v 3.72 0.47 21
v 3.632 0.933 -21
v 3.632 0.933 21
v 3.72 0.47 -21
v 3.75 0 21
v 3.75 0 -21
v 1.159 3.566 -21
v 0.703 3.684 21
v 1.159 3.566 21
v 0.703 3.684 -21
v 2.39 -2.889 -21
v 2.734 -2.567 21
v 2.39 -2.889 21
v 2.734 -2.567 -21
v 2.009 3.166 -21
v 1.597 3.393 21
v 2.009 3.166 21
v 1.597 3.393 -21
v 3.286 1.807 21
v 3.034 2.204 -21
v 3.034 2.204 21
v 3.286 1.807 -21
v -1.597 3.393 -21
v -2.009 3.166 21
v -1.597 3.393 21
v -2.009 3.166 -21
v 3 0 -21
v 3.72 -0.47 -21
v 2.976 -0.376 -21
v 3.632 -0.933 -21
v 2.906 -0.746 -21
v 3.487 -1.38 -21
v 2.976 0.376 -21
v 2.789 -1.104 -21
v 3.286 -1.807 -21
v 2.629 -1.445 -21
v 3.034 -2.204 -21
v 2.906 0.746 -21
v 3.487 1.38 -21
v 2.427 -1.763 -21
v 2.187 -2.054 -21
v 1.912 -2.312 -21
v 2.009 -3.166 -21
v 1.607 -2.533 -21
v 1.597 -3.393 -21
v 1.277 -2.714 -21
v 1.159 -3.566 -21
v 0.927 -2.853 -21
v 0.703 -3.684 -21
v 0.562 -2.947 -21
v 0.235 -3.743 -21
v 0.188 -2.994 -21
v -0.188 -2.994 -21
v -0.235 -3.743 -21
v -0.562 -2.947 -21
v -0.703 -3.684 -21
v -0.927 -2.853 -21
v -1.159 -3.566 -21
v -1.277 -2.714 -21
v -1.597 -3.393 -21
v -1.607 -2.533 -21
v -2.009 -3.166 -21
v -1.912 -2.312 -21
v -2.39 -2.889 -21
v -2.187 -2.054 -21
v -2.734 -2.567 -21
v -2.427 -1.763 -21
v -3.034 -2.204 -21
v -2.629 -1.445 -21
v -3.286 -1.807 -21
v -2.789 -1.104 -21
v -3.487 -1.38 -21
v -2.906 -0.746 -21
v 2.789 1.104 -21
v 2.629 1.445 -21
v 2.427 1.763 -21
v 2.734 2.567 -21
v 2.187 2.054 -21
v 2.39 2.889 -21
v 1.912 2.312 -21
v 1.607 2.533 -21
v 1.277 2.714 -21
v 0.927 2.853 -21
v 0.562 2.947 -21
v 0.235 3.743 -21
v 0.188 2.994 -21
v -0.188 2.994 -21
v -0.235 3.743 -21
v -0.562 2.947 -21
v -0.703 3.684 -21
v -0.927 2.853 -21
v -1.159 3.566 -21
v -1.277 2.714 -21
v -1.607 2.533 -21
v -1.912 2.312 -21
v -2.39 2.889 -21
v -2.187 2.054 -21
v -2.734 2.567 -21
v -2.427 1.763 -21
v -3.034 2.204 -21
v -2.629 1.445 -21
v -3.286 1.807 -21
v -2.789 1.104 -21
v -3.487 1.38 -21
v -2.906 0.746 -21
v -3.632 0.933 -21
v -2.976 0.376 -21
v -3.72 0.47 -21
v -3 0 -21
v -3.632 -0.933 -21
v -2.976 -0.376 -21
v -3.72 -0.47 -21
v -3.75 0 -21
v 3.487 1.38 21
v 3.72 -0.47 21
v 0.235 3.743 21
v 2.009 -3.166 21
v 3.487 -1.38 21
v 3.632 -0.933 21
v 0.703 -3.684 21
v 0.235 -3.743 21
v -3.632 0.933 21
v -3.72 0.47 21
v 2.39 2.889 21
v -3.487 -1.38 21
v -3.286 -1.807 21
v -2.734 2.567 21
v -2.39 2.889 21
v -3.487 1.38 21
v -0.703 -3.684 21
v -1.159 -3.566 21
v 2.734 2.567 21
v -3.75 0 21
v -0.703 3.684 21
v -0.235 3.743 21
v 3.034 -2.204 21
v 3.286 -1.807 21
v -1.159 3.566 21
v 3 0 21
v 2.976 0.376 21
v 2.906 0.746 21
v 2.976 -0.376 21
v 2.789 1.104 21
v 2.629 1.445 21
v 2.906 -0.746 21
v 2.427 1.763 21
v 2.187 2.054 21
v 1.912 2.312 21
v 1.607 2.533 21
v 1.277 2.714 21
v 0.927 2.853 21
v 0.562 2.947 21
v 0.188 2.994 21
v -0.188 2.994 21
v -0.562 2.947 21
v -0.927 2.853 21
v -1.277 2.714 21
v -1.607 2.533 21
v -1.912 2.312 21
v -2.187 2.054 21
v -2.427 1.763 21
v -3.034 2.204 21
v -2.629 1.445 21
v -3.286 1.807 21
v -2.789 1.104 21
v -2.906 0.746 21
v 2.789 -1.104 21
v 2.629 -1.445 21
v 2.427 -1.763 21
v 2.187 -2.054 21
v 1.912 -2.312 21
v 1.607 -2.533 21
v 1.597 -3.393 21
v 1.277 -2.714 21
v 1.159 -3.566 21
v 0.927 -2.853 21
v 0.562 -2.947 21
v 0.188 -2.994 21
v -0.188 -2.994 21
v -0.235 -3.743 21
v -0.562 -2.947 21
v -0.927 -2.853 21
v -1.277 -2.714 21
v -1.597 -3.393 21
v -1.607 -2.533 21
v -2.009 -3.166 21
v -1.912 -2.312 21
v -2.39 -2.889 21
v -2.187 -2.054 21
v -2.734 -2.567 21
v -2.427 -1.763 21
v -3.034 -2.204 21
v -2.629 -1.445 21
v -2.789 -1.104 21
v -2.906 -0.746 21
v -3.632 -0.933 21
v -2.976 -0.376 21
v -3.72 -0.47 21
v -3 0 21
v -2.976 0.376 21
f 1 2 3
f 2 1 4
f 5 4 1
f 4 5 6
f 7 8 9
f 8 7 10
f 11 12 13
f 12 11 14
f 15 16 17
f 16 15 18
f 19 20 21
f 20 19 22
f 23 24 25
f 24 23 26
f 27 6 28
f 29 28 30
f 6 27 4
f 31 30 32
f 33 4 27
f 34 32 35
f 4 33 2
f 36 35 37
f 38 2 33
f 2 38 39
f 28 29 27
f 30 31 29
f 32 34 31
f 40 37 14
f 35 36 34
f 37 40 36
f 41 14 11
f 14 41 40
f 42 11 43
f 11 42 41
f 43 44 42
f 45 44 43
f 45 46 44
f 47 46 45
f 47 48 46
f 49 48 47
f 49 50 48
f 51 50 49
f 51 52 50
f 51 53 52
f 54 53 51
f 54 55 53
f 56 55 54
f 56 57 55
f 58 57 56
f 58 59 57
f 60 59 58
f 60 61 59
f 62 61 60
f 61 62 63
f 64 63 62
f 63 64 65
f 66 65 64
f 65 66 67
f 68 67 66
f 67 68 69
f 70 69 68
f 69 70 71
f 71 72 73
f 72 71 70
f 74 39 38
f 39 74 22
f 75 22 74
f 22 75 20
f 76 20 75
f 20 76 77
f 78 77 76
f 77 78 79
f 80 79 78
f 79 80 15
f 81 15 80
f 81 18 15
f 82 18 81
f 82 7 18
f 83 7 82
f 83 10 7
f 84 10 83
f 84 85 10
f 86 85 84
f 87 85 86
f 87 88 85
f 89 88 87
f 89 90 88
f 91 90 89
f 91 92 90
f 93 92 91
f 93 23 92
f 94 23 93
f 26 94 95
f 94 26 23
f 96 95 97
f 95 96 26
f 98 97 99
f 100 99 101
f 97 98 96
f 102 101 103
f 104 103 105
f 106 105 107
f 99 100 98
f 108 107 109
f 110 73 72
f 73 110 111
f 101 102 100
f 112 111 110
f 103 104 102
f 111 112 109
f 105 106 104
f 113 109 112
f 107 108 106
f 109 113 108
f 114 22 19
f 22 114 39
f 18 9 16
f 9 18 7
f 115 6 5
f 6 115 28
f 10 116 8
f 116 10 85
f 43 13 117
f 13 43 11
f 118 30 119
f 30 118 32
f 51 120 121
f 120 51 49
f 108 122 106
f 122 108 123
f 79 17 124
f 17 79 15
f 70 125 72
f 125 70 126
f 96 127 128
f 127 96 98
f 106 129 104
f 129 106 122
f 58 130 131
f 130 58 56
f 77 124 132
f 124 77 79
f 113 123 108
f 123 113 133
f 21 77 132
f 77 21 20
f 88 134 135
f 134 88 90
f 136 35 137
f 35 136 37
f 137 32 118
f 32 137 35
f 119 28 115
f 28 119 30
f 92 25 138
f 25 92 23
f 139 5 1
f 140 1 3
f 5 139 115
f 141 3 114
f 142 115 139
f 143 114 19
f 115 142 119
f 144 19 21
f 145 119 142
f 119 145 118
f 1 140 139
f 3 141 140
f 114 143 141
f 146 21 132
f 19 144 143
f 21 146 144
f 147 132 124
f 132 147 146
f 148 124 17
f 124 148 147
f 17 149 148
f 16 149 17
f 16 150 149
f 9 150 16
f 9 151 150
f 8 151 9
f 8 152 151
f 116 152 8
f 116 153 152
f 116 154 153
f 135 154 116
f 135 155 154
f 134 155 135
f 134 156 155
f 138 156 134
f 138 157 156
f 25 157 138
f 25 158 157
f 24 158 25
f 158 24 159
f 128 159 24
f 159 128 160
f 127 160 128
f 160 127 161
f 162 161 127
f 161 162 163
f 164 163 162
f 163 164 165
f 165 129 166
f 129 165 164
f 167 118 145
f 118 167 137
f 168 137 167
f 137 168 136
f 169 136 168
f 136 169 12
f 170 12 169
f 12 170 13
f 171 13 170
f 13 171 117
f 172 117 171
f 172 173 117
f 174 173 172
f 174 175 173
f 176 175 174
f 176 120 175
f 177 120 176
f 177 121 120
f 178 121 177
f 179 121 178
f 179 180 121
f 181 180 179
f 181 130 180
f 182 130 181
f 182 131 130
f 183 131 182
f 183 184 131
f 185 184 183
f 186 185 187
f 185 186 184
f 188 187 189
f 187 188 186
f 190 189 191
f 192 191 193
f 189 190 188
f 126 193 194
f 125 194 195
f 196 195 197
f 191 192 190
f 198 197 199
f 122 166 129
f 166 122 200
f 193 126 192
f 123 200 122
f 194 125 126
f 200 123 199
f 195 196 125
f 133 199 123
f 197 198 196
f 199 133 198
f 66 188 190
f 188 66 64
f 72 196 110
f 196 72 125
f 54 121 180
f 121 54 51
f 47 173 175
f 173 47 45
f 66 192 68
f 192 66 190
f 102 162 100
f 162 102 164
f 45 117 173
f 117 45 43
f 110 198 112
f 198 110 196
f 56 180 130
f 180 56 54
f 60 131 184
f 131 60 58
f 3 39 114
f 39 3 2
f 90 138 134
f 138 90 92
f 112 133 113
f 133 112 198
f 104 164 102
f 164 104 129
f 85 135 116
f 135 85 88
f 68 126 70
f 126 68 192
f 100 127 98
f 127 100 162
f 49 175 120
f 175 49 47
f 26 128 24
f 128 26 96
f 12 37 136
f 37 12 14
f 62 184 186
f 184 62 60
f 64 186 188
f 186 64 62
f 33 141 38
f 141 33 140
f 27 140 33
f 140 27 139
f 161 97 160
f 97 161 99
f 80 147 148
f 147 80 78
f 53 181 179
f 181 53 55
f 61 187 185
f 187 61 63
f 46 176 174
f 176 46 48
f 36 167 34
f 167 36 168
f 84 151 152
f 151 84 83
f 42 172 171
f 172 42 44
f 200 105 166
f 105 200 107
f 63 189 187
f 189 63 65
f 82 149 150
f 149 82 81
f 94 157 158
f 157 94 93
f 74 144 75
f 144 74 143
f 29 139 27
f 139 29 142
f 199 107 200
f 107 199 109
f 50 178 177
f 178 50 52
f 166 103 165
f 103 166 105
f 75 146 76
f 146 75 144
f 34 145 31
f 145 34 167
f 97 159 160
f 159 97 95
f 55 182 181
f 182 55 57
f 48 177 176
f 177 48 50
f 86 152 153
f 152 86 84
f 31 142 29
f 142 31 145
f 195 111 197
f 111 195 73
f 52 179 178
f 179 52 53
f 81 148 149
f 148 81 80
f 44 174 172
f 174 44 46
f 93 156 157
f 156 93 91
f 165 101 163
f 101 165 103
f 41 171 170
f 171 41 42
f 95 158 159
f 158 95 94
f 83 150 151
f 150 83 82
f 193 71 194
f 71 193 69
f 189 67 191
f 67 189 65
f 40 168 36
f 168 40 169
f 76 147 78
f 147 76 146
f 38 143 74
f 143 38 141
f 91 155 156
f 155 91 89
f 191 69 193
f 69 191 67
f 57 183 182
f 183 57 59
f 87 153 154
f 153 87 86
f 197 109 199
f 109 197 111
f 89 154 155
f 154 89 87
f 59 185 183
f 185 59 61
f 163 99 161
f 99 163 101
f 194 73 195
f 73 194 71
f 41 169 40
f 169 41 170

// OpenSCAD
$fn = 50;


difference() {
	union() {
		translate(v = [0, 0, -21.0000000000]) {
			cylinder(h = 42, r = 3.7500000000);
		}
	}
	union() {
		translate(v = [0, 0, -100.0000000000]) {
			cylinder(h = 200, r = 3.0000000000);
		}
	}
}
